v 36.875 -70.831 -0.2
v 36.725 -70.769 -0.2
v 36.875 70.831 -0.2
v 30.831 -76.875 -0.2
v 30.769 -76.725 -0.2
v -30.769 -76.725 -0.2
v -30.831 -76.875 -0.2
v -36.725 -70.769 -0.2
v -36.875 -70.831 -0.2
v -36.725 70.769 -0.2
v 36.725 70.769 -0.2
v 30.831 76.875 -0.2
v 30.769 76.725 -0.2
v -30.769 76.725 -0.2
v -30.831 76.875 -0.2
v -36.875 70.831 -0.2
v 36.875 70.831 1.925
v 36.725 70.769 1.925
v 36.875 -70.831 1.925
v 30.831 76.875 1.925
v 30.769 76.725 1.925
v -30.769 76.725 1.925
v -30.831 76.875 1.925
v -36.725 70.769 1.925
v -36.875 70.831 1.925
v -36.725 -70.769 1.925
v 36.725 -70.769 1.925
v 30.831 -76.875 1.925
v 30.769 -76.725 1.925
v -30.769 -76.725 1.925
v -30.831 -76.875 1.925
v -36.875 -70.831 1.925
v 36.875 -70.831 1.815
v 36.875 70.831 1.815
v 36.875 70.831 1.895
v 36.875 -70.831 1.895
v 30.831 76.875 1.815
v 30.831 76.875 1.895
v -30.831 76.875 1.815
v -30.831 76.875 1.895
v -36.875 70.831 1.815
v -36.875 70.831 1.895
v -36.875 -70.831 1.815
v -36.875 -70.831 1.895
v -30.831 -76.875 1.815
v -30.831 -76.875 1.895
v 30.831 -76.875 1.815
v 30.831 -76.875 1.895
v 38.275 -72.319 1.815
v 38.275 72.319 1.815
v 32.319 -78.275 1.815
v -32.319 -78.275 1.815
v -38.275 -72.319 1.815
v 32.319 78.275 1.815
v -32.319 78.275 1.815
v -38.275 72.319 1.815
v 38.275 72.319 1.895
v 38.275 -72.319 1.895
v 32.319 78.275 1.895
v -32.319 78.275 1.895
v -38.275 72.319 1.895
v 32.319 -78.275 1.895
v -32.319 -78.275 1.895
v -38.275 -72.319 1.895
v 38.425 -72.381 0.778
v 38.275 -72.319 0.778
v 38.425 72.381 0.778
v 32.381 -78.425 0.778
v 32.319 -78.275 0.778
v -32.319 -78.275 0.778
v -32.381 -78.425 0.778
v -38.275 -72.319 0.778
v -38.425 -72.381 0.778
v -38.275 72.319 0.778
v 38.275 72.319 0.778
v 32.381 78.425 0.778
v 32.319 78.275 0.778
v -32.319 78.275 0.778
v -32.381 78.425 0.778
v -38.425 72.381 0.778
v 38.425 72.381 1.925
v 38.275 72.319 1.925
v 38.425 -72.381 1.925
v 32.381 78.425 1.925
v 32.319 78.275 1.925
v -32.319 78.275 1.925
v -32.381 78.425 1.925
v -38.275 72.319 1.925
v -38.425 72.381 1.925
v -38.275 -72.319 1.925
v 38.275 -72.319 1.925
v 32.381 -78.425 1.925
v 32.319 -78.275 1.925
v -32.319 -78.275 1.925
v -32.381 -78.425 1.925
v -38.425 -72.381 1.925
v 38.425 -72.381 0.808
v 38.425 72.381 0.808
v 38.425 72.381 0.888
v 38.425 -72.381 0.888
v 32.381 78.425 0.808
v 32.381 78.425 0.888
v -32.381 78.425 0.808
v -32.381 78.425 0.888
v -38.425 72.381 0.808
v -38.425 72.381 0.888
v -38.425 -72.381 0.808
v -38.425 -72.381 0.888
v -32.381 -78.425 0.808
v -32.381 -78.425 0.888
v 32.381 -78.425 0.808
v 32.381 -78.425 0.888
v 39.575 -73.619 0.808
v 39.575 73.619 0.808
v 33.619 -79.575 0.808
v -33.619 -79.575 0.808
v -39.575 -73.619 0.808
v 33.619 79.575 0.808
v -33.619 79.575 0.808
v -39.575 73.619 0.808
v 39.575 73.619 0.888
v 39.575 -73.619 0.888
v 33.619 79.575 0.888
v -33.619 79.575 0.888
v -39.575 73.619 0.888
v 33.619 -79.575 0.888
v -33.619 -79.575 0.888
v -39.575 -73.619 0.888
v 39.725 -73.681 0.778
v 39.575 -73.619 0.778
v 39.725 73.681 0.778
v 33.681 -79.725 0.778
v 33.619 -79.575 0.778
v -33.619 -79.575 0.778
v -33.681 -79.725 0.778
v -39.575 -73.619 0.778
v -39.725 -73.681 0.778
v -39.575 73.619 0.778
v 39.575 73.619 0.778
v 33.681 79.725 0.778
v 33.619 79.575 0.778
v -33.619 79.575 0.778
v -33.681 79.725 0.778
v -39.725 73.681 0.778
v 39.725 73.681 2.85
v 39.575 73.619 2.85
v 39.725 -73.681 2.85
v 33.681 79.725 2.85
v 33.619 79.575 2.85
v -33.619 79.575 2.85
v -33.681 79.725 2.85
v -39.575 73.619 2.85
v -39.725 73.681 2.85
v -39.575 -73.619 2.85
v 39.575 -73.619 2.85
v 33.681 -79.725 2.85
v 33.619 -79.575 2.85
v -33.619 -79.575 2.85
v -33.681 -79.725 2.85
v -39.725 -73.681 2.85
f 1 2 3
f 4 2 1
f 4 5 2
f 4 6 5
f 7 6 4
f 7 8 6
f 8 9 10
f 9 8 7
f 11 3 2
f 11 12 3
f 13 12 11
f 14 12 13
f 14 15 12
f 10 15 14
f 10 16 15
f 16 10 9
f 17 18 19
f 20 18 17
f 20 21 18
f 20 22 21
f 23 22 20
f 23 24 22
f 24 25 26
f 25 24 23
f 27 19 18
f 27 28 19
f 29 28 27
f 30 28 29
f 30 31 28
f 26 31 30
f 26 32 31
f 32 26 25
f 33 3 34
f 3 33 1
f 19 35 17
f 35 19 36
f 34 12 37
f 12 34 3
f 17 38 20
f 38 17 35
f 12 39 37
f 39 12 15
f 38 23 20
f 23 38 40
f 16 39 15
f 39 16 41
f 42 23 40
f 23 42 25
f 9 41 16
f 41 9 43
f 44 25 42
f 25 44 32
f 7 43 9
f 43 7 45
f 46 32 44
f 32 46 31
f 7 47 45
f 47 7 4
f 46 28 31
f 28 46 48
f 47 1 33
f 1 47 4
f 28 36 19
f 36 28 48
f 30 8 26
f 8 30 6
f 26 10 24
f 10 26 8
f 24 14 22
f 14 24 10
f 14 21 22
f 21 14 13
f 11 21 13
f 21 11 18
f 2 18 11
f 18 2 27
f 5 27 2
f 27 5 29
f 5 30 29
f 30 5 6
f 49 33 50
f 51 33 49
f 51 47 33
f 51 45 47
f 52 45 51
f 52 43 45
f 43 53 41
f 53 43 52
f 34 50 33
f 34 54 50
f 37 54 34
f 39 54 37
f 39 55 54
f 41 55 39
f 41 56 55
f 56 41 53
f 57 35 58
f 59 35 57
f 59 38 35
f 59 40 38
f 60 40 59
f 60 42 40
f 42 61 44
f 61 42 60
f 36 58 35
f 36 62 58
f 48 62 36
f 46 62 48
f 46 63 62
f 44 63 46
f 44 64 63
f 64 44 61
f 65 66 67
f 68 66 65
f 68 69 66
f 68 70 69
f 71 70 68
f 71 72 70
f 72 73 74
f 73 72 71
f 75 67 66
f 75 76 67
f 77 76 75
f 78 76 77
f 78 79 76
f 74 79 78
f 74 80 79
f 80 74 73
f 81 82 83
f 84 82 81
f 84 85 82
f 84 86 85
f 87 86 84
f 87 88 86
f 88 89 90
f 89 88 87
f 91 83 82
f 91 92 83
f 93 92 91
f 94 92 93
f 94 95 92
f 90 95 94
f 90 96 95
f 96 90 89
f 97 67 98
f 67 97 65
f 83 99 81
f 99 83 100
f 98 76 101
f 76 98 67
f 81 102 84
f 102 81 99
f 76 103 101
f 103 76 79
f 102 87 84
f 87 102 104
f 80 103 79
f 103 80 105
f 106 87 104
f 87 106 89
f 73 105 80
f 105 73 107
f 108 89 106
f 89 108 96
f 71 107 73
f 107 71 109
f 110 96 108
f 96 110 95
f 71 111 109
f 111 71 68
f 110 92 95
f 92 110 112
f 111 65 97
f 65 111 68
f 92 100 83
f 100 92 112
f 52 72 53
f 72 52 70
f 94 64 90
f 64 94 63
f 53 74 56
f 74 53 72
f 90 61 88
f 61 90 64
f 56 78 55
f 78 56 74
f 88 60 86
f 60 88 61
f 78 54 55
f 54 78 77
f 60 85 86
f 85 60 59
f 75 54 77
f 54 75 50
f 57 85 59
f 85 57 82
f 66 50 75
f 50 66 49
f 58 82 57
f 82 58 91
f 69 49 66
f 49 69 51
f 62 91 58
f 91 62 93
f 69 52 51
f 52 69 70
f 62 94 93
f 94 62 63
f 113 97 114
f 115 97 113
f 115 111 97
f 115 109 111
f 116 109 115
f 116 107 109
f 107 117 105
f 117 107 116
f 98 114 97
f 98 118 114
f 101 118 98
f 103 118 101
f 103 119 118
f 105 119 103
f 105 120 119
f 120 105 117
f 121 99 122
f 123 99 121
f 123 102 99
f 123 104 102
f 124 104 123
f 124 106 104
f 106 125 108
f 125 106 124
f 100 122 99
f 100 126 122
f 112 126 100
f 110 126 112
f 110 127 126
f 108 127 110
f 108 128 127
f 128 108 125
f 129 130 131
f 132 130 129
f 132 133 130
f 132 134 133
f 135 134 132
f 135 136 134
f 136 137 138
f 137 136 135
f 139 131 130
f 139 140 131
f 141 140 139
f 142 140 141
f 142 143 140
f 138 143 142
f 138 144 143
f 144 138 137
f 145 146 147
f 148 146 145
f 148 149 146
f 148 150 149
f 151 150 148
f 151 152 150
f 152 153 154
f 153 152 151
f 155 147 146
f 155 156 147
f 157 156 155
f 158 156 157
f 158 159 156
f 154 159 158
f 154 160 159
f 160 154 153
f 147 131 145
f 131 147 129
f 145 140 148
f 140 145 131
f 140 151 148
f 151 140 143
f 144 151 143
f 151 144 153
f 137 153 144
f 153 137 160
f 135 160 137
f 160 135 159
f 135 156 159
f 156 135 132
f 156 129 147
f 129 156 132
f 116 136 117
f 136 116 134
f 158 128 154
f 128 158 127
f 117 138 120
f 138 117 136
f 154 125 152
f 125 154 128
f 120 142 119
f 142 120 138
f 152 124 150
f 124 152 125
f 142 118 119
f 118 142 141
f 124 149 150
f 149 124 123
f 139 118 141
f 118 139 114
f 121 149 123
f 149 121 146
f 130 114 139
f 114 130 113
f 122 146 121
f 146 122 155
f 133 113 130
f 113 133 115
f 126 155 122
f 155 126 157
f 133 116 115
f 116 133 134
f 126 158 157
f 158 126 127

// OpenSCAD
/*
  PARAMETRIC VERTICAL-CAPTURE PERIMETER SPLIT CUTTER
  =================================================

  PURPOSE
  -------
  Generate the complete 3D negative-volume cutter that splits a one-piece
  flexible phone case into a rigid central backplate and a TPU perimeter.
  This is NOT a straight vertical slit. The cutter follows the same stepped
  vertical-capture profile as the accepted S25 Ultra three-piece reference.

  In a section through a straight edge, the cutter path follows five segments:
    1. Inner vertical wall, from the exterior back to the upper step.
    2. Upper horizontal shoulder, moving outward.
    3. Middle vertical wall, descending to the lower step.
    4. Lower horizontal shoulder, moving outward again.
    5. Outer vertical wall, rising to the phone-facing backplate surface.

  After subtracting the cutter, the middle-height material sequence is:
    RIGID CORE | TPU TONGUE | RIGID RETAINING RAIL | TPU OUTER PERIMETER

  The TPU tongue remains connected to the outer TPU perimeter below the rail.
  The rigid retaining rail remains connected to the backplate above the tongue.
  The opposed vertical faces resist horizontal separation; the horizontal
  shoulders provide vertical capture. The resulting cut should separate the
  host case into two connected solids, provided no uncut bridges remain.

  MAIN INPUTS (millimetres)
  ------------------------
    split_boundary_width   - width of the visible outer backplate outline
    split_boundary_height  - height of that outline
    split_corner_chamfer   - chamfer leg length along each straight edge
    backplate_thickness    - thickness at the backplate/perimeter joint

  ADVANCED PROFILE PARAMETERS
  ---------------------------
  The default insets, step fractions and clearances reproduce the proportions
  of the accepted S25 Ultra joint. They are starting values, not universal
  dimensions. Inspect the wall thickness, camera/port/button clearances and
  actual section on every new case.

  OUTPUT MODES
  ------------
    "all"      - complete one-piece profiled cutter ring (recommended)
    "straight" - four straight-edge cutter pieces
    "corners"  - four chamfer-corner cutter pieces

  Use either "all", OR use "straight" + "corners" once each. Do not subtract
  the full cutter and its component exports together.
*/

// -------------------- MAIN CASE INPUTS --------------------
split_boundary_width  = 80.00;  // mm: outer width of visible backplate outline
split_boundary_height = 160.00; // mm: outer height of visible backplate outline
split_corner_chamfer  = 6.00;   // mm: chamfer leg measured along each straight edge
backplate_thickness   = 2.65;   // mm: Z thickness at the backplate/perimeter joint

// -------------------- PROFILE / FIT PARAMETERS --------------------
// Insets are measured inward from the visible backplate outline.
// Keep INNER > MIDDLE > OUTER. Defaults reproduce the accepted S25 profile.
joint_inner_inset  = 3.20;  // rigid core / TPU tongue boundary
joint_middle_inset = 1.65;  // TPU tongue / rigid retaining rail boundary
joint_outer_inset  = 0.35;  // rigid retaining rail / TPU outer frame boundary

// Step heights as fractions of backplate_thickness, from the exterior rear face.
// For T=2.65 mm these give 0.848 mm and 1.855 mm, matching the S25 reference.
joint_lower_step_fraction = 0.32;
joint_upper_step_fraction = 0.70;

// Clearances between the resulting mating surfaces.
joint_radial_clearance   = 0.15; // mm: total width of each vertical-face cut
joint_vertical_clearance = 0.08; // mm: total height of each horizontal-face cut
joint_boolean_overlap    = 0.03; // mm: local overlap only where cutter segments meet
cut_end_overrun           = 0.20; // mm: extends cutter beyond backplate top/bottom

// Placement: centre of the backplate outline and exterior-back Z datum.
split_center_x = 0.00;
split_center_y = 0.00;
base_z         = 0.00;

output_mode = "all"; // "all", "straight" or "corners"
$fn = 32;

// -------------------- DERIVED VALUES --------------------
step_lower_z = base_z + backplate_thickness*joint_lower_step_fraction;
step_upper_z = base_z + backplate_thickness*joint_upper_step_fraction;
profile_top_z = base_z + backplate_thickness;
max_inset = joint_inner_inset;
min_inset = joint_outer_inset;

// -------------------- INPUT VALIDATION --------------------
assert(split_boundary_width > 0 && split_boundary_height > 0,
       "Backplate width and height must be positive millimetre values.");
assert(split_corner_chamfer >= 0,
       "split_corner_chamfer cannot be negative.");
assert(split_boundary_width > 2*(max_inset + split_corner_chamfer + 1),
       "Backplate width too small for selected insets and chamfer.");
assert(split_boundary_height > 2*(max_inset + split_corner_chamfer + 1),
       "Backplate height too small for selected insets and chamfer.");
assert(joint_inner_inset > joint_middle_inset && joint_middle_inset > joint_outer_inset,
       "Insets must satisfy inner > middle > outer.");
assert(joint_outer_inset >= 0,
       "joint_outer_inset cannot be negative.");
assert(joint_lower_step_fraction > 0 && joint_upper_step_fraction < 1 &&
       joint_lower_step_fraction < joint_upper_step_fraction,
       "Step fractions must satisfy 0 < lower < upper < 1.");
assert(joint_radial_clearance > 0 && joint_vertical_clearance > 0,
       "Joint clearances must be positive.");
assert(joint_boolean_overlap >= 0 && cut_end_overrun > 0,
       "Boolean overlap must be non-negative and cut_end_overrun must be positive.");
assert(joint_radial_clearance < 2*min(joint_inner_inset-joint_middle_inset,
                                      joint_middle_inset-joint_outer_inset),
       "Radial clearance is too large for the selected hook widths.");
assert(backplate_thickness > 1.5,
       "Backplate thickness is too small for this two-step profile.");

// -------------------- 2D OUTLINE HELPERS --------------------
// inset=0 is the visible outer outline; positive inset moves toward the centre.
module chamfered_outline(inset=0) {
    w = split_boundary_width - 2*inset;
    h = split_boundary_height - 2*inset;
    c = min(split_corner_chamfer, min(w,h)/2 - 0.01);
    polygon([
        [-w/2+c, -h/2], [ w/2-c, -h/2],
        [ w/2, -h/2+c], [ w/2,  h/2-c],
        [ w/2-c, h/2], [-w/2+c, h/2],
        [-w/2, h/2-c], [-w/2, -h/2+c]
    ]);
}

// Ring-shaped channel around one contour: a vertical profile face.
module vertical_profile_channel(inset, z0, z1) {
    translate([0,0,z0])
        linear_extrude(height=max(0.001,z1-z0), convexity=6)
            difference() {
                offset(delta=joint_radial_clearance/2)
                    chamfered_outline(inset);
                offset(delta=-joint_radial_clearance/2)
                    chamfered_outline(inset);
            }
}

// Horizontal shoulder channel between two nested contours.
// outer_inset is smaller because that contour lies farther toward the case edge.
module horizontal_profile_channel(inner_inset, outer_inset, zcenter) {
    translate([0,0,zcenter-joint_vertical_clearance/2])
        linear_extrude(height=joint_vertical_clearance, convexity=6)
            difference() {
                offset(delta=joint_boolean_overlap)
                    chamfered_outline(outer_inset);
                offset(delta=-joint_boolean_overlap)
                    chamfered_outline(inner_inset);
            }
}

// Complete five-segment profile, carried around the chamfered-rectangle plan path.
module complete_profile_cutter() {
    union() {
        // 1. Inner wall: exterior-back face up to the upper shoulder.
        vertical_profile_channel(
            joint_inner_inset,
            base_z-cut_end_overrun,
            step_upper_z+joint_vertical_clearance/2+joint_boolean_overlap
        );

        // 2. Upper shoulder: inner contour outward to the middle contour.
        horizontal_profile_channel(
            joint_inner_inset, joint_middle_inset, step_upper_z
        );

        // 3. Middle vertical wall: between upper and lower shoulders.
        vertical_profile_channel(
            joint_middle_inset,
            step_lower_z-joint_vertical_clearance/2-joint_boolean_overlap,
            step_upper_z+joint_vertical_clearance/2+joint_boolean_overlap
        );

        // 4. Lower shoulder: middle contour outward to the outer contour.
        horizontal_profile_channel(
            joint_middle_inset, joint_outer_inset, step_lower_z
        );

        // 5. Outer wall: lower shoulder up through the backplate top face.
        vertical_profile_channel(
            joint_outer_inset,
            step_lower_z-joint_vertical_clearance/2-joint_boolean_overlap,
            profile_top_z+cut_end_overrun
        );
    }
}

// Masks that separate long straight edge runs from the four corner/chamfer runs.
// The straight masks stop at the innermost contour's chamfer start. The remaining
// cutter volume is classified as the four corner pieces.
module straight_edge_mask_2d() {
    half_x = split_boundary_width/2 - split_corner_chamfer - max_inset - 0.02;
    half_y = split_boundary_height/2 - split_corner_chamfer - max_inset - 0.02;
    radial_span = max_inset-min_inset + joint_radial_clearance + 2*joint_boolean_overlap + 0.04;
    radial_mid = (max_inset+min_inset)/2;
    union() {
        translate([0, split_boundary_height/2-radial_mid, 0])
            square([2*half_x, radial_span], center=true);
        translate([0,-split_boundary_height/2+radial_mid, 0])
            square([2*half_x, radial_span], center=true);
        translate([ split_boundary_width/2-radial_mid, 0, 0])
            square([radial_span, 2*half_y], center=true);
        translate([-split_boundary_width/2+radial_mid, 0, 0])
            square([radial_span, 2*half_y], center=true);
    }
}

module straight_mask_3d() {
    translate([0,0,base_z-cut_end_overrun-0.01])
        linear_extrude(height=backplate_thickness+2*cut_end_overrun+0.02)
            straight_edge_mask_2d();
}

module selected_profile_cutter() {
    if (output_mode == "all") {
        complete_profile_cutter();
    } else if (output_mode == "straight") {
        intersection() {
            complete_profile_cutter();
            straight_mask_3d();
        }
    } else if (output_mode == "corners") {
        difference() {
            complete_profile_cutter();
            intersection() {
                complete_profile_cutter();
                straight_mask_3d();
            }
        }
    } else {
        assert(false, "output_mode must be all, straight or corners");
    }
}

translate([split_center_x,split_center_y,0])
    selected_profile_cutter();
